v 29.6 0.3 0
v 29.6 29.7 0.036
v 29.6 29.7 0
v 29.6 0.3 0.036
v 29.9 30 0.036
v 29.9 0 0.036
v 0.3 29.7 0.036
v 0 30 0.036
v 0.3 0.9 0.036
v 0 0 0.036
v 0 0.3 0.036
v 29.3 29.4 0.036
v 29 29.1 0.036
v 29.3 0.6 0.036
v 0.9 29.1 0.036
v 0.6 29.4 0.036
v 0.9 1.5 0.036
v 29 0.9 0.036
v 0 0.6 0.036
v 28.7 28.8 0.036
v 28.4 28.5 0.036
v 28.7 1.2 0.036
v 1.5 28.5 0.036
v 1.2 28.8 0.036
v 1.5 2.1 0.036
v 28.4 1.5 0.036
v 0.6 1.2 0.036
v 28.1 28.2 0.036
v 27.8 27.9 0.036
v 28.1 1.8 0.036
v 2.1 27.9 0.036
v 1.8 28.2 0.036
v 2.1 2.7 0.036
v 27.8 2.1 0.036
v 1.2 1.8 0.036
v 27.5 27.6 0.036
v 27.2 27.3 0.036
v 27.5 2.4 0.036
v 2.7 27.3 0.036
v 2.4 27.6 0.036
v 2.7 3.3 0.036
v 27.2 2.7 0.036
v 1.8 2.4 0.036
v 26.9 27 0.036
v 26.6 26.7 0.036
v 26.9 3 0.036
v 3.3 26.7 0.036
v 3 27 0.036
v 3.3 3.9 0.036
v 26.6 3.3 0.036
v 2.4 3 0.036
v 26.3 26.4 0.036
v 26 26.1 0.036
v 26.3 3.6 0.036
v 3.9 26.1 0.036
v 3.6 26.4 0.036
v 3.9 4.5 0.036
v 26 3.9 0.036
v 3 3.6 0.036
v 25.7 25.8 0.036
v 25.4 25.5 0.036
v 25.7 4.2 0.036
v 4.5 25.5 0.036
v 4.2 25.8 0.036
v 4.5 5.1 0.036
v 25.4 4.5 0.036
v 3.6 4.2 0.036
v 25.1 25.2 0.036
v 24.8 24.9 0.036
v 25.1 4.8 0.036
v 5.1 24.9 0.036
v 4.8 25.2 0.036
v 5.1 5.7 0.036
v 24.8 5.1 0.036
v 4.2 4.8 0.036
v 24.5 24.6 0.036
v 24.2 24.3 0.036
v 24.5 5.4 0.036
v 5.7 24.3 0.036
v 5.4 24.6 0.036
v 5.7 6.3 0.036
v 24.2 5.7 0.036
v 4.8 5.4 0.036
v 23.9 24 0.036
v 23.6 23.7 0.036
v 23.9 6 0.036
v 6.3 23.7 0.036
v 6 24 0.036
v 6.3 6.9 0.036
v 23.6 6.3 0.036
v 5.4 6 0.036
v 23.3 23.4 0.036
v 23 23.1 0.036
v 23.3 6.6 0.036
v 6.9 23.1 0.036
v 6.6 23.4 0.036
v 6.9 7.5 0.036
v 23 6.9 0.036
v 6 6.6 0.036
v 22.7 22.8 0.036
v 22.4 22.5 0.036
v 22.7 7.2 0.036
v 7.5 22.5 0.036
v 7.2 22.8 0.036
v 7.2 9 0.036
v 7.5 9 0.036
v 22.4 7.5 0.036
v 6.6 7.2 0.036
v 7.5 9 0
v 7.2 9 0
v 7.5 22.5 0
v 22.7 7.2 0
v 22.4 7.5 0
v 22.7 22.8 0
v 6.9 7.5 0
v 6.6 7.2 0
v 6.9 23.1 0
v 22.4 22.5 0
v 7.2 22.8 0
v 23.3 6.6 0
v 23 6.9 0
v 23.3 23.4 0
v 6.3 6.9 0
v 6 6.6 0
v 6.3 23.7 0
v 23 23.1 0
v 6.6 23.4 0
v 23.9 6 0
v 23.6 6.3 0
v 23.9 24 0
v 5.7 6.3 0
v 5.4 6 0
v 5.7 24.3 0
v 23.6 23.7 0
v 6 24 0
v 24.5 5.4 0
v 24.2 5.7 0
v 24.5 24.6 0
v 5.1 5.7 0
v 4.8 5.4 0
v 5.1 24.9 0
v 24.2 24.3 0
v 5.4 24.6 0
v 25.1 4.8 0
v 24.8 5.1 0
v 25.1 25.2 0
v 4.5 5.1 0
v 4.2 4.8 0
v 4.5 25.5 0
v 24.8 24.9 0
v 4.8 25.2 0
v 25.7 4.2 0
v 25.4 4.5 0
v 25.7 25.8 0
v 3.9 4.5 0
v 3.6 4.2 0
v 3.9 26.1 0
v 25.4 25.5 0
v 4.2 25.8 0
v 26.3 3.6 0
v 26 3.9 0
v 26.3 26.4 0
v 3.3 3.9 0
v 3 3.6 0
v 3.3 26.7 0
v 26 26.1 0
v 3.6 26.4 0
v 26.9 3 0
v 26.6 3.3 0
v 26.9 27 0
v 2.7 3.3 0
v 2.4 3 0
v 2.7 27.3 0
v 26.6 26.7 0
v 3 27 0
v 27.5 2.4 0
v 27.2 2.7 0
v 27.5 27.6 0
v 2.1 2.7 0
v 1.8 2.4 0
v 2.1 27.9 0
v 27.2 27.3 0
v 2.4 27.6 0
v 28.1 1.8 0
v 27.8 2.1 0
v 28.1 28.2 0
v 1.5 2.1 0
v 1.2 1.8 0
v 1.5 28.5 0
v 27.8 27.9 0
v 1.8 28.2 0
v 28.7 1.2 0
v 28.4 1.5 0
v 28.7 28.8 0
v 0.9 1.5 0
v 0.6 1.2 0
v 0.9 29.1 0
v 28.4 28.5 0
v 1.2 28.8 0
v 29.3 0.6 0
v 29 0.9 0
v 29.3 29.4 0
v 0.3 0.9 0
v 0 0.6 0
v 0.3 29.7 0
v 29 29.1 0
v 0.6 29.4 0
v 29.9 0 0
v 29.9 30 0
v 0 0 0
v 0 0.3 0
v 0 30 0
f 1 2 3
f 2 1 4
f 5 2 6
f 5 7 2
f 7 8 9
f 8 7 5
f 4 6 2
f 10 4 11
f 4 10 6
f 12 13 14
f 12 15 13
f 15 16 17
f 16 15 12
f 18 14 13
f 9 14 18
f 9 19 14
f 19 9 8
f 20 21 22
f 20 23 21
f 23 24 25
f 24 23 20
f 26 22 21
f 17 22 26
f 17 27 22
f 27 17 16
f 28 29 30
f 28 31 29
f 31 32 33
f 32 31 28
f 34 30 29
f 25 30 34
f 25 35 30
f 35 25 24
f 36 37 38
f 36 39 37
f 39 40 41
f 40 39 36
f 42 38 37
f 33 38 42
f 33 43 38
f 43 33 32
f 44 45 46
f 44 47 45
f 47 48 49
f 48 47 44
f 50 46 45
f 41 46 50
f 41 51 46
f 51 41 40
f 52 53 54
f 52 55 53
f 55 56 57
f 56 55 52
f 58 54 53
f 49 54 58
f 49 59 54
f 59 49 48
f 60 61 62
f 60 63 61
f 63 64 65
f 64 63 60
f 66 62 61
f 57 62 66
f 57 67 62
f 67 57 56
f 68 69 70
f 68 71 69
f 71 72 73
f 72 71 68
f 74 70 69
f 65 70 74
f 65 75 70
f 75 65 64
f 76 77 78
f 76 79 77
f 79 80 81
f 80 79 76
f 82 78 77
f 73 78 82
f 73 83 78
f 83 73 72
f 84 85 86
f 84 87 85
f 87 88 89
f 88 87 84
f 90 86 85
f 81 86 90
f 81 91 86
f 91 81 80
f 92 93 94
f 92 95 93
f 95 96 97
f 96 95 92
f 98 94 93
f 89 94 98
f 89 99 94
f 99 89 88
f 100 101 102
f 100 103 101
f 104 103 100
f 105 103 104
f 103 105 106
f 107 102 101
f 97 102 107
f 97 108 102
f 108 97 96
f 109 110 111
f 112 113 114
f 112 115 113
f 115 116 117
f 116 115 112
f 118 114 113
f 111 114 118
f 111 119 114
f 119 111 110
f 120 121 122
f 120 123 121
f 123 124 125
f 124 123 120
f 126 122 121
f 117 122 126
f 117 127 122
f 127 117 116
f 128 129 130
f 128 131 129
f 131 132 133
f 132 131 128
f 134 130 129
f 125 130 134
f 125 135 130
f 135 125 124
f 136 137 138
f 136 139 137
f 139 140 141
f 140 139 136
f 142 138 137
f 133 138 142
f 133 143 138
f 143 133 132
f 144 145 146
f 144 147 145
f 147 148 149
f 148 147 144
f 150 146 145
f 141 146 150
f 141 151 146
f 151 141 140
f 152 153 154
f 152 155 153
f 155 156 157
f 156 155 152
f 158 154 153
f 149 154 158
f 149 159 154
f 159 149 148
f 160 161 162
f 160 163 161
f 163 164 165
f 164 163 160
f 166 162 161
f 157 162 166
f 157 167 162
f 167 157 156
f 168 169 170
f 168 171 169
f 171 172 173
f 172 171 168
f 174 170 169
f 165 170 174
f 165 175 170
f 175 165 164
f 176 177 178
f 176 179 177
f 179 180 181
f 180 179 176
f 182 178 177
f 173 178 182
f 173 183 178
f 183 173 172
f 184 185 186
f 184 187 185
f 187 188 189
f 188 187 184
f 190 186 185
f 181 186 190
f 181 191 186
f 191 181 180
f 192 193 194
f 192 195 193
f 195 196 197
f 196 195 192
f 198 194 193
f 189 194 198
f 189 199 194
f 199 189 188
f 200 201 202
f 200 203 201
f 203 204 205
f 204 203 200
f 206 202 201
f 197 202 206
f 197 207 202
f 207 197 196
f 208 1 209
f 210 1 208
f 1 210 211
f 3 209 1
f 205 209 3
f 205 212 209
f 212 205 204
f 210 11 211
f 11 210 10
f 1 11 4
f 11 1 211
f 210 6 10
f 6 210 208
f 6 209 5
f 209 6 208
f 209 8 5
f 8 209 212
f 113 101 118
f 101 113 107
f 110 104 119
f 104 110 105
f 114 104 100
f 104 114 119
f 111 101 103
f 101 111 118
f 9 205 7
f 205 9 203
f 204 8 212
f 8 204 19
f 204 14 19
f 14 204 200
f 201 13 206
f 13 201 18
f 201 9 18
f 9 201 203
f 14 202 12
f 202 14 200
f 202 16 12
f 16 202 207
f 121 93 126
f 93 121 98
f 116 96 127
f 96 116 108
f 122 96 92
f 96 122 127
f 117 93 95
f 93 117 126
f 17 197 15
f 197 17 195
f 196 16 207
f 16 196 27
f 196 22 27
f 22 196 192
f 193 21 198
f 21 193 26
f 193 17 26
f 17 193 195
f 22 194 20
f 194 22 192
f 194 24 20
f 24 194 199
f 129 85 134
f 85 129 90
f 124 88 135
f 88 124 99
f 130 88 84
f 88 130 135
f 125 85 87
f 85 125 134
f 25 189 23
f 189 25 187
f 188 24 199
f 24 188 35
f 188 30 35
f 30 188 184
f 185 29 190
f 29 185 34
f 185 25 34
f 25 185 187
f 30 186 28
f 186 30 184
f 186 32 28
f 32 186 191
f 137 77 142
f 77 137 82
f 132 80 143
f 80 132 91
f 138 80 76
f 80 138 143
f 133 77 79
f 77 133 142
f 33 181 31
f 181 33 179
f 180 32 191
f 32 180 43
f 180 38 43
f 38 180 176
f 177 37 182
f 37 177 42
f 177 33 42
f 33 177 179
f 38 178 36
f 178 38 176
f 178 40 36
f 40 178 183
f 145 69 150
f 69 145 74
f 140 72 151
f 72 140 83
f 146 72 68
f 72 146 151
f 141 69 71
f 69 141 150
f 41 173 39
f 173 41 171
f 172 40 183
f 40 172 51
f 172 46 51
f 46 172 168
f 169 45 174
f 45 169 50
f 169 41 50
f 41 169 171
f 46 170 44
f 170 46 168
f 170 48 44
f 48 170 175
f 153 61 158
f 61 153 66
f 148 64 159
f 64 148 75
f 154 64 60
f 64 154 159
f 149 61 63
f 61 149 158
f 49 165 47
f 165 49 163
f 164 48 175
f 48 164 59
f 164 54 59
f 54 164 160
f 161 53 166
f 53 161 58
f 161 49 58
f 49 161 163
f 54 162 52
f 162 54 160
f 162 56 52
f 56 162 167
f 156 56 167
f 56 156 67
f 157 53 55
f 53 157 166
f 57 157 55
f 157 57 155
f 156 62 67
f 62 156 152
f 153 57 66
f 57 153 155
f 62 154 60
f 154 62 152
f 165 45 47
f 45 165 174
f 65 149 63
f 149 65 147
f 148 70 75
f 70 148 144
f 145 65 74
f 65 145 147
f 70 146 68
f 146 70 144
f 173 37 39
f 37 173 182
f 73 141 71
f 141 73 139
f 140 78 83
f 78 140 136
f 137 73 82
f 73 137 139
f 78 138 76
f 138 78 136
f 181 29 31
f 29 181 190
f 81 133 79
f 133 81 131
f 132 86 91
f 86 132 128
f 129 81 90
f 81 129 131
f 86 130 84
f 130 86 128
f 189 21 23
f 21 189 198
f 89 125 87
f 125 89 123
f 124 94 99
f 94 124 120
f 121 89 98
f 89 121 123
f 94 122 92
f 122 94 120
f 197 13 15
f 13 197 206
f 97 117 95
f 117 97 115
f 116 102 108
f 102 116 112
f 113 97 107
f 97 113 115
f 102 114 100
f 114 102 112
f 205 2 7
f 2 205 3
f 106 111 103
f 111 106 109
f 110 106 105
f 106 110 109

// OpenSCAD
// Physical dimensions
turns = 12;
length = 29.6;
width = 30;
copper_width = 0.3;
copper_spacing = 0.3;
thickness = 0.03556;

for(i=[0:turns]) {
    // Bottom half horizontal lines
    // Starting condition
    if(i < 2) {
        translate([0,2*i*copper_spacing,0])
            cube([length - 2*i*copper_spacing,copper_width,thickness]);
    }
    else {
        translate([2*(i-1)*copper_spacing,2*i*copper_spacing,0])
            cube([length - (4*i-2)*copper_spacing,copper_width,thickness]);
    }
    
    // Right half vertical lines
    translate([length-2*i*copper_spacing,2*i*copper_spacing,0])
        cube([copper_width,width - 4*i*copper_spacing,thickness]);
    
    // Top half horizontal lines
    translate([2*(turns-i)*copper_spacing,width-2*(turns-i)*copper_spacing-copper_spacing,0])
        cube([length-4*(turns-i)*copper_spacing,copper_width,thickness]);
    
    // Left half vertical lines
    if(i < 1) {
        translate([0,2*copper_spacing,0])
            cube([copper_width,(width - 2*copper_spacing),thickness]);
    }
    // Last segment must be shorter in order to add the connexion pads
    if(i==turns) {
        translate([2*i*copper_spacing,2*(i+3)*copper_spacing,0])
            cube([copper_width,width-(4*i+6)*copper_spacing,thickness]);
    }
    else {
        translate([2*i*copper_spacing,2*(i+1)*copper_spacing,0])
            cube([copper_width,width-(4*i+2)*copper_spacing,thickness]);
    }  
}
